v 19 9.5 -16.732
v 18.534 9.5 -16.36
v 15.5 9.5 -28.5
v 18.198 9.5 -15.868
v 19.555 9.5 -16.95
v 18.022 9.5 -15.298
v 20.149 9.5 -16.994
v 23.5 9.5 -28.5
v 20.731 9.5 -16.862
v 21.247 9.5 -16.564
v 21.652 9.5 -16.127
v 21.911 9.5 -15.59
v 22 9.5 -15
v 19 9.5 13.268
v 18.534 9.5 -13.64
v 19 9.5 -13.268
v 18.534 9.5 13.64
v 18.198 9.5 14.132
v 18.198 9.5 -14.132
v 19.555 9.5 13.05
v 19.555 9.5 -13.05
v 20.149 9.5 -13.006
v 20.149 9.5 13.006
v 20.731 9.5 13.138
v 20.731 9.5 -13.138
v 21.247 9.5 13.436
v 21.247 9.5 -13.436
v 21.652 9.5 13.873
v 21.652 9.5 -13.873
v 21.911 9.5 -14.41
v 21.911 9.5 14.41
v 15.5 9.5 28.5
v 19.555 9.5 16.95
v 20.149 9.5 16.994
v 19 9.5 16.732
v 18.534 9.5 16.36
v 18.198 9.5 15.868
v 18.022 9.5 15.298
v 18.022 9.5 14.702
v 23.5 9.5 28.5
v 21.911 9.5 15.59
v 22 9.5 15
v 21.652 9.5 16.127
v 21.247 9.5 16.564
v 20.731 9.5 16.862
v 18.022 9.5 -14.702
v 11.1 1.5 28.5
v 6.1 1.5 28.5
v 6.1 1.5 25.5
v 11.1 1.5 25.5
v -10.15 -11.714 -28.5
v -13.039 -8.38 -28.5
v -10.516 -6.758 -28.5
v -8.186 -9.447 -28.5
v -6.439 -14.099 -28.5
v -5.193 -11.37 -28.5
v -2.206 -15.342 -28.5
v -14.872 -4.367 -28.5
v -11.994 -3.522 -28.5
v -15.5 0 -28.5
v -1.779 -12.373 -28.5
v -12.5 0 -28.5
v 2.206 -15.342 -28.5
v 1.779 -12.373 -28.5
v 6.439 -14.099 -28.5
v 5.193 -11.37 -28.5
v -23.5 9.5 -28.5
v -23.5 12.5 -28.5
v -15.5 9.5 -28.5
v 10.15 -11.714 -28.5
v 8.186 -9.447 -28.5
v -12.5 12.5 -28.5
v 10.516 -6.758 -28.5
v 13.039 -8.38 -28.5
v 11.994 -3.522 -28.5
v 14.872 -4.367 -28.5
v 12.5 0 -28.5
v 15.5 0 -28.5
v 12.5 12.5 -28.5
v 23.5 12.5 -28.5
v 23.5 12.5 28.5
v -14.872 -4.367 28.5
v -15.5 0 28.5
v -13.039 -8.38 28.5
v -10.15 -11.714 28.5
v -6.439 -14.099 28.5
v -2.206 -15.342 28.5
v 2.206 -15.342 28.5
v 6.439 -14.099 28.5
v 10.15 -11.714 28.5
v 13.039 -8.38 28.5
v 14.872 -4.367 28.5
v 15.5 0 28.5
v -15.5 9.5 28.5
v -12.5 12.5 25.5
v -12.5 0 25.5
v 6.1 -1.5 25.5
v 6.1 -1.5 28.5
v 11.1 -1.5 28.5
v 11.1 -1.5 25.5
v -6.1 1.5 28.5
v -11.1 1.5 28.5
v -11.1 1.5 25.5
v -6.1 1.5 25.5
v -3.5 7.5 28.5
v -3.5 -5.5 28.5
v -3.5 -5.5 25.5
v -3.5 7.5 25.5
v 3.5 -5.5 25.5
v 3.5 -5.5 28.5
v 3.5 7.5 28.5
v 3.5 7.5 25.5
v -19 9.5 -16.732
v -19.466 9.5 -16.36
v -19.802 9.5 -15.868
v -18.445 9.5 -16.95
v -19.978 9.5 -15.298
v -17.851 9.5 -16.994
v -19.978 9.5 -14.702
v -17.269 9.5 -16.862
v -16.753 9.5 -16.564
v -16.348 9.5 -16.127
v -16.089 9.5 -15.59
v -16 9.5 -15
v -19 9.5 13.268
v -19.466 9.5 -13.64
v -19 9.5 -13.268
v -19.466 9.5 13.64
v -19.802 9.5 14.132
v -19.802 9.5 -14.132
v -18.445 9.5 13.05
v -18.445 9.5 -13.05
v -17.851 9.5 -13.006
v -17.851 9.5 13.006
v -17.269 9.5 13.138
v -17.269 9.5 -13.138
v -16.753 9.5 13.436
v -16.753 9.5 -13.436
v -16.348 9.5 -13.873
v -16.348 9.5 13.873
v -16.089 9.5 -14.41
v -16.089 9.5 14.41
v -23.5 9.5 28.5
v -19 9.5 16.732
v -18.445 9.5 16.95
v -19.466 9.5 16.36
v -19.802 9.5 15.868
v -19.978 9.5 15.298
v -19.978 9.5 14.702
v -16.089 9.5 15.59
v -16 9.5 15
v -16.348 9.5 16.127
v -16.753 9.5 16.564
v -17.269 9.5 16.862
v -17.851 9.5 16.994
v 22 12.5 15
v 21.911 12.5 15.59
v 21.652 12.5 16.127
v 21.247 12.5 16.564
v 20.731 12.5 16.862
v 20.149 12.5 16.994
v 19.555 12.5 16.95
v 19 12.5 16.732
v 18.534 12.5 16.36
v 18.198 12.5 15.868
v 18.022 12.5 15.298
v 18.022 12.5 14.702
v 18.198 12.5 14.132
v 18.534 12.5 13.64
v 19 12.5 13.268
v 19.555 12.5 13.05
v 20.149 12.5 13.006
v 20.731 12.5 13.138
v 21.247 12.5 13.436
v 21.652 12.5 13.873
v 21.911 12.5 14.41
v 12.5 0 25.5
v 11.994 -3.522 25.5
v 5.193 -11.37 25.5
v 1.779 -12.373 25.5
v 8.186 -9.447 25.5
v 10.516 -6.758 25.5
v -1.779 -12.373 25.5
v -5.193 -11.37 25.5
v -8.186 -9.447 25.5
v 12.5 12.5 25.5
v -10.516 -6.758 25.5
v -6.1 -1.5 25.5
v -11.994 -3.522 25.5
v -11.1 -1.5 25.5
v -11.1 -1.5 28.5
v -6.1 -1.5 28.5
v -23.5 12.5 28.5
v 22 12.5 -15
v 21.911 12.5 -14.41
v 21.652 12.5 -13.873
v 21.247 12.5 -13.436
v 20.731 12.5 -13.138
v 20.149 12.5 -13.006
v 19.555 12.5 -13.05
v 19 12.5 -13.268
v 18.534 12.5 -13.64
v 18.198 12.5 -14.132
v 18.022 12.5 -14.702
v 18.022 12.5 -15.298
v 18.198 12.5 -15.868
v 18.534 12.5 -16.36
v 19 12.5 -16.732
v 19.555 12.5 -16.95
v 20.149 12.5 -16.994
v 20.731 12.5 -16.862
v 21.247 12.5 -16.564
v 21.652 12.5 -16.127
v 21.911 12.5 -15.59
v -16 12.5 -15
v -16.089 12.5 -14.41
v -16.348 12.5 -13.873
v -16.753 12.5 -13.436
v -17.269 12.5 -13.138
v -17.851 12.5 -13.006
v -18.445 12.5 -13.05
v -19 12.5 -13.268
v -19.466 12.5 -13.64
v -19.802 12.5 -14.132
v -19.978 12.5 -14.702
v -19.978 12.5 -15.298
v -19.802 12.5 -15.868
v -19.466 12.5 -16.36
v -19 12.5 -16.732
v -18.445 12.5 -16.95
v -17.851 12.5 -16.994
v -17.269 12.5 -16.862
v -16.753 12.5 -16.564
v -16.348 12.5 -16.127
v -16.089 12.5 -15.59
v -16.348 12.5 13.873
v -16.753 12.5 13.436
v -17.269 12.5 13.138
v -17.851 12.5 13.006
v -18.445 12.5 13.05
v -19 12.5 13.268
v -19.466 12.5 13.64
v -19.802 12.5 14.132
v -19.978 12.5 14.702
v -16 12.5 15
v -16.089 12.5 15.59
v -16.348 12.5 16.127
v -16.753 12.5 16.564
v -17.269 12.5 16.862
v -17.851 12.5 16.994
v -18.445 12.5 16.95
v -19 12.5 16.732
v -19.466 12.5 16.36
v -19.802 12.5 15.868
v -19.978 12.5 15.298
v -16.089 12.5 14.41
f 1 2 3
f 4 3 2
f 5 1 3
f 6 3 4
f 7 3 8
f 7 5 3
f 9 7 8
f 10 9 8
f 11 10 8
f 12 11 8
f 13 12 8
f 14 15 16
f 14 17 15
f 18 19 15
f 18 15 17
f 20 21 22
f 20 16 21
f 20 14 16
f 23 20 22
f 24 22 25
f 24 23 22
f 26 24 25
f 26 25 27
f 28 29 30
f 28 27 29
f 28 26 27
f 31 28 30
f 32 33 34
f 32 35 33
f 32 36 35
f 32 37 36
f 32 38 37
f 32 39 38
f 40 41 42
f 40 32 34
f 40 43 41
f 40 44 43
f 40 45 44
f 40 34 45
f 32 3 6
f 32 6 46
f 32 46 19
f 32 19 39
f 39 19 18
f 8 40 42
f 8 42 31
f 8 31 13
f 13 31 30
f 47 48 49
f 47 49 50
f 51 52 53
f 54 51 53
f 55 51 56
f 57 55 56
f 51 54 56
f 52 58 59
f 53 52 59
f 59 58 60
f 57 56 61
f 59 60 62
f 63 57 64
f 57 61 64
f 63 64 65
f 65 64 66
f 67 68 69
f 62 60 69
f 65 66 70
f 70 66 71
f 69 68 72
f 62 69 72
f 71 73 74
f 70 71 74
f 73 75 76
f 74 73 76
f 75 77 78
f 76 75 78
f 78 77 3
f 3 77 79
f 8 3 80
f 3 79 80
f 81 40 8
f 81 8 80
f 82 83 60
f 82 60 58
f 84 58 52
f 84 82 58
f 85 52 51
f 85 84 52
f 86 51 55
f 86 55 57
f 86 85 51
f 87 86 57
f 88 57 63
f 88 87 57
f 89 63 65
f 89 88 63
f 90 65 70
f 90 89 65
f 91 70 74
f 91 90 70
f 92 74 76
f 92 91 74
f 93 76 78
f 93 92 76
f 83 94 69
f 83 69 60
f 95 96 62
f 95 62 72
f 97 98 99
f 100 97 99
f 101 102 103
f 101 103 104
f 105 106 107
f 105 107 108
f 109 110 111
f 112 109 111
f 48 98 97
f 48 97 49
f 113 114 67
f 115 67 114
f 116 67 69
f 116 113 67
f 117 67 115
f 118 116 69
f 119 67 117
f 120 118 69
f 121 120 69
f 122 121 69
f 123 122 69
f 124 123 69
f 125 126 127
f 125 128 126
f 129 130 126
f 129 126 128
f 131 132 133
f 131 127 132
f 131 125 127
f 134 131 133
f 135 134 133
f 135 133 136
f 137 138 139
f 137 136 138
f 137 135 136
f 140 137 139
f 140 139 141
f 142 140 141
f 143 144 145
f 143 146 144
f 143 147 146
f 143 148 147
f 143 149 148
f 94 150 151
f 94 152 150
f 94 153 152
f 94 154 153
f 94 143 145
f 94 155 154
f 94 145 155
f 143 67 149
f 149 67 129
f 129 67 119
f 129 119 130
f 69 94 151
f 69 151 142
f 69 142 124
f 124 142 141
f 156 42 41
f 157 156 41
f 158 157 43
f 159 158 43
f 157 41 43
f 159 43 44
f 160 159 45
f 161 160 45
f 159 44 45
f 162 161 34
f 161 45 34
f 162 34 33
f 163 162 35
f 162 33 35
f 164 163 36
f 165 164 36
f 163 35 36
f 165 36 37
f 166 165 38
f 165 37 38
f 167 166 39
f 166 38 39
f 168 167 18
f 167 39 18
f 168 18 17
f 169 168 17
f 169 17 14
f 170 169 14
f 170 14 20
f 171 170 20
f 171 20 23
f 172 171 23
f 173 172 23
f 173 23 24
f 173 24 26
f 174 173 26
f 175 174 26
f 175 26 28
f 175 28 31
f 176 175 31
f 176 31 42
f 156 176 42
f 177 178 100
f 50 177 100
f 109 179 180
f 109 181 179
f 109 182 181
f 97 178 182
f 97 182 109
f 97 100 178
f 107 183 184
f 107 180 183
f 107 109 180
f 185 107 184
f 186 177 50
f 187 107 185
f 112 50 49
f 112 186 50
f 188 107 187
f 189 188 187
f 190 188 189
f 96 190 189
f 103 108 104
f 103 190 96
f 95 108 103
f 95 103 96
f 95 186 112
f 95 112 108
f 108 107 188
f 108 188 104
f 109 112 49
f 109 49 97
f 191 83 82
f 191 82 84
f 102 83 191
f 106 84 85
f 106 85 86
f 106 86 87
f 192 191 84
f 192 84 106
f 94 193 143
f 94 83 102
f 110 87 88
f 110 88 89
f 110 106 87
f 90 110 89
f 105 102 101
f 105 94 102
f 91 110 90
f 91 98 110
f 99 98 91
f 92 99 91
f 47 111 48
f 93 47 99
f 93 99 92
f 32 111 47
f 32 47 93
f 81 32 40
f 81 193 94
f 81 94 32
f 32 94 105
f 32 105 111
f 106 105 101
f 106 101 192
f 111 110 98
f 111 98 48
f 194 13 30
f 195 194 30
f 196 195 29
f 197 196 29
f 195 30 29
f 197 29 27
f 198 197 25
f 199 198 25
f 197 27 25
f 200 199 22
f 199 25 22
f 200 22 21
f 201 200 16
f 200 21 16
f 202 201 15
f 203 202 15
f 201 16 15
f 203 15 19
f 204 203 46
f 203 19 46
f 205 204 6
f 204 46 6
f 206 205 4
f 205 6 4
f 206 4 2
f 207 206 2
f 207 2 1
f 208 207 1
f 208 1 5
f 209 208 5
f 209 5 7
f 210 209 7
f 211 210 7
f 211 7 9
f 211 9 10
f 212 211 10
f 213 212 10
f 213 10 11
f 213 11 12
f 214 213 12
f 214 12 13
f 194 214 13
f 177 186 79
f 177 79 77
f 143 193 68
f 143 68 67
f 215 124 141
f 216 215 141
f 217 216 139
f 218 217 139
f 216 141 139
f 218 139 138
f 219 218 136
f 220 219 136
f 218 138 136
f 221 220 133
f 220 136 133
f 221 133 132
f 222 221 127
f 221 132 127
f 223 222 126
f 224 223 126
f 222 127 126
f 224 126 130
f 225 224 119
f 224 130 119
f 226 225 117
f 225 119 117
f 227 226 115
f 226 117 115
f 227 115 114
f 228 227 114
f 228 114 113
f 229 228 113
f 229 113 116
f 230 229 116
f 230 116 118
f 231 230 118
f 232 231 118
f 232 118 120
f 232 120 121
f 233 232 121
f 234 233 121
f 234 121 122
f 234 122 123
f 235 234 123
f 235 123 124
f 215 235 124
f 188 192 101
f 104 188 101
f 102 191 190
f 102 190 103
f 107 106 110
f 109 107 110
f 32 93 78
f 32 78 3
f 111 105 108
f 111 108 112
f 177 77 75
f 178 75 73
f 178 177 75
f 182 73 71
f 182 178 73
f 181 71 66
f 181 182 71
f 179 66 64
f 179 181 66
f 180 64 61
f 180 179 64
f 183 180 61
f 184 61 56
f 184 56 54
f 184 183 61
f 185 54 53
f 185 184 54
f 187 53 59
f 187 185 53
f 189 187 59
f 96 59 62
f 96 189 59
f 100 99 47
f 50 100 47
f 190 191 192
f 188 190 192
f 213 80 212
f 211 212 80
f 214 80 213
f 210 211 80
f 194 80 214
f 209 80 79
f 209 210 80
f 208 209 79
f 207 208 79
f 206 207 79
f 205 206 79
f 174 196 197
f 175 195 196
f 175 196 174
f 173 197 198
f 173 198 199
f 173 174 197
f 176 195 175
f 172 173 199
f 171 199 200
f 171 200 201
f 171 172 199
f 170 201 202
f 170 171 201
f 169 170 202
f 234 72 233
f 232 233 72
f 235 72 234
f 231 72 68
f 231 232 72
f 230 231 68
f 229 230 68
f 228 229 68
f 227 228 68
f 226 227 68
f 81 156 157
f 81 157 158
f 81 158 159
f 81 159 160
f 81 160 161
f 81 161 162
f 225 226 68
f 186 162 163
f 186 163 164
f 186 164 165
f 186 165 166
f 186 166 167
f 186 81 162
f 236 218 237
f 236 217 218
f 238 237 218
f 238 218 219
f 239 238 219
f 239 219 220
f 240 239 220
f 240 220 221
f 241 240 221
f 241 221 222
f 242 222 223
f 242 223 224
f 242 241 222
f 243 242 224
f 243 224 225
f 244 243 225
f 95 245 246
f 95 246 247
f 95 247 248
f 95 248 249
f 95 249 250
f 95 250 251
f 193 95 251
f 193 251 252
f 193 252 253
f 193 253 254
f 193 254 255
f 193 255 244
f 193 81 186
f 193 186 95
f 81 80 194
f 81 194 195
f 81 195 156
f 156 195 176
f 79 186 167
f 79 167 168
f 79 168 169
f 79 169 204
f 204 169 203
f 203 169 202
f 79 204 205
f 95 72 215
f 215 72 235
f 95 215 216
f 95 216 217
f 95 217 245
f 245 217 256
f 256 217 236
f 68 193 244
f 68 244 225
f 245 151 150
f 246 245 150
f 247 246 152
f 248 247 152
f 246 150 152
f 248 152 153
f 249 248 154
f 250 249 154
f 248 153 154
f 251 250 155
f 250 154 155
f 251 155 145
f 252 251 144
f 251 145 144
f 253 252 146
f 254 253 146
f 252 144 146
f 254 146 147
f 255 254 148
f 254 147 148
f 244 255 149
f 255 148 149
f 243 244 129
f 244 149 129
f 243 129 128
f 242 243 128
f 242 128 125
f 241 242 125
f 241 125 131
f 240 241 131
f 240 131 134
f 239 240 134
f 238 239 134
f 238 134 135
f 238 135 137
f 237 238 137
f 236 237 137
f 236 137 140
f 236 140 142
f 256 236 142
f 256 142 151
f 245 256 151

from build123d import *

# Parameters (mm, degrees)
SALIENTE_EXTRUIR1_DEPTH = 28.5
CROQUIS2_R              = 2
CORTAR_EXTRUIR1_DEPTH   = 5
SALIENTE_EXTRUIR2_DEPTH = 3
CROQUIS4_W              = 5
CROQUIS4_H              = 3
CROQUIS4_W_2            = 7
CROQUIS4_H_2            = 13
CORTAR_EXTRUIR3_DEPTH   = 3


with BuildPart() as part:
    # Croquis1 → Saliente-Extruir1 (new, symmetric)
    with BuildSketch(Plane.XY):
        with BuildLine():
            Line((-12.5, 0), (-12.5, 12.5))
            Line((-12.5, 12.5), (-23.5, 12.5))
            Line((-23.5, 12.5), (-23.5, 9.5))
            Line((-23.5, 9.5), (-15.5, 9.5))
            Line((-15.5, 9.5), (-15.5, 0))
            ThreePointArc((-15.5, 0), (0, -15.5), (15.5, 0))
            Line((15.5, 0), (15.5, 9.5))
            Line((15.5, 9.5), (23.5, 9.5))
            Line((23.5, 9.5), (23.5, 12.5))
            Line((23.5, 12.5), (12.5, 12.5))
            Line((12.5, 12.5), (12.5, 0))
            ThreePointArc((12.5, 0), (0, -12.5), (-12.5, 0))
        make_face()
    extrude(amount=SALIENTE_EXTRUIR1_DEPTH, both=True)

    # Croquis2 → Cortar-Extruir1 (cut)
    with BuildSketch(Plane.XZ.offset(-9.5)):
        with Locations((-18, 15)):
            Circle(CROQUIS2_R)
        with Locations((-18, -15)):
            Circle(CROQUIS2_R)
        with Locations((20, 15)):
            Circle(CROQUIS2_R)
        with Locations((20, -15)):
            Circle(CROQUIS2_R)
    extrude(amount=-CORTAR_EXTRUIR1_DEPTH, mode=Mode.SUBTRACT)

    # Croquis3 → Saliente-Extruir2 (add)
    with BuildSketch(Plane.XY.offset(28.5)):
        with BuildLine():
            Line((-15.5, 12.5), (15.5, 12.5))
            Line((15.5, 12.5), (15.5, 0))
            ThreePointArc((15.5, 0), (0, -15.5), (-15.5, 0))
            Line((-15.5, 0), (-15.5, 12.5))
        make_face()
    extrude(amount=-SALIENTE_EXTRUIR2_DEPTH)

    # Croquis4 → Cortar-Extruir3 (cut)
    with BuildSketch(Plane.XY.offset(28.5)):
        with Locations((-8.6, 0)):
            Rectangle(CROQUIS4_W, CROQUIS4_H)
        with Locations((0, 1)):
            Rectangle(CROQUIS4_W_2, CROQUIS4_H_2)
        with Locations((8.6, 0)):
            Rectangle(CROQUIS4_W, CROQUIS4_H)
    extrude(amount=-CORTAR_EXTRUIR3_DEPTH, mode=Mode.SUBTRACT)


solid = part.part
